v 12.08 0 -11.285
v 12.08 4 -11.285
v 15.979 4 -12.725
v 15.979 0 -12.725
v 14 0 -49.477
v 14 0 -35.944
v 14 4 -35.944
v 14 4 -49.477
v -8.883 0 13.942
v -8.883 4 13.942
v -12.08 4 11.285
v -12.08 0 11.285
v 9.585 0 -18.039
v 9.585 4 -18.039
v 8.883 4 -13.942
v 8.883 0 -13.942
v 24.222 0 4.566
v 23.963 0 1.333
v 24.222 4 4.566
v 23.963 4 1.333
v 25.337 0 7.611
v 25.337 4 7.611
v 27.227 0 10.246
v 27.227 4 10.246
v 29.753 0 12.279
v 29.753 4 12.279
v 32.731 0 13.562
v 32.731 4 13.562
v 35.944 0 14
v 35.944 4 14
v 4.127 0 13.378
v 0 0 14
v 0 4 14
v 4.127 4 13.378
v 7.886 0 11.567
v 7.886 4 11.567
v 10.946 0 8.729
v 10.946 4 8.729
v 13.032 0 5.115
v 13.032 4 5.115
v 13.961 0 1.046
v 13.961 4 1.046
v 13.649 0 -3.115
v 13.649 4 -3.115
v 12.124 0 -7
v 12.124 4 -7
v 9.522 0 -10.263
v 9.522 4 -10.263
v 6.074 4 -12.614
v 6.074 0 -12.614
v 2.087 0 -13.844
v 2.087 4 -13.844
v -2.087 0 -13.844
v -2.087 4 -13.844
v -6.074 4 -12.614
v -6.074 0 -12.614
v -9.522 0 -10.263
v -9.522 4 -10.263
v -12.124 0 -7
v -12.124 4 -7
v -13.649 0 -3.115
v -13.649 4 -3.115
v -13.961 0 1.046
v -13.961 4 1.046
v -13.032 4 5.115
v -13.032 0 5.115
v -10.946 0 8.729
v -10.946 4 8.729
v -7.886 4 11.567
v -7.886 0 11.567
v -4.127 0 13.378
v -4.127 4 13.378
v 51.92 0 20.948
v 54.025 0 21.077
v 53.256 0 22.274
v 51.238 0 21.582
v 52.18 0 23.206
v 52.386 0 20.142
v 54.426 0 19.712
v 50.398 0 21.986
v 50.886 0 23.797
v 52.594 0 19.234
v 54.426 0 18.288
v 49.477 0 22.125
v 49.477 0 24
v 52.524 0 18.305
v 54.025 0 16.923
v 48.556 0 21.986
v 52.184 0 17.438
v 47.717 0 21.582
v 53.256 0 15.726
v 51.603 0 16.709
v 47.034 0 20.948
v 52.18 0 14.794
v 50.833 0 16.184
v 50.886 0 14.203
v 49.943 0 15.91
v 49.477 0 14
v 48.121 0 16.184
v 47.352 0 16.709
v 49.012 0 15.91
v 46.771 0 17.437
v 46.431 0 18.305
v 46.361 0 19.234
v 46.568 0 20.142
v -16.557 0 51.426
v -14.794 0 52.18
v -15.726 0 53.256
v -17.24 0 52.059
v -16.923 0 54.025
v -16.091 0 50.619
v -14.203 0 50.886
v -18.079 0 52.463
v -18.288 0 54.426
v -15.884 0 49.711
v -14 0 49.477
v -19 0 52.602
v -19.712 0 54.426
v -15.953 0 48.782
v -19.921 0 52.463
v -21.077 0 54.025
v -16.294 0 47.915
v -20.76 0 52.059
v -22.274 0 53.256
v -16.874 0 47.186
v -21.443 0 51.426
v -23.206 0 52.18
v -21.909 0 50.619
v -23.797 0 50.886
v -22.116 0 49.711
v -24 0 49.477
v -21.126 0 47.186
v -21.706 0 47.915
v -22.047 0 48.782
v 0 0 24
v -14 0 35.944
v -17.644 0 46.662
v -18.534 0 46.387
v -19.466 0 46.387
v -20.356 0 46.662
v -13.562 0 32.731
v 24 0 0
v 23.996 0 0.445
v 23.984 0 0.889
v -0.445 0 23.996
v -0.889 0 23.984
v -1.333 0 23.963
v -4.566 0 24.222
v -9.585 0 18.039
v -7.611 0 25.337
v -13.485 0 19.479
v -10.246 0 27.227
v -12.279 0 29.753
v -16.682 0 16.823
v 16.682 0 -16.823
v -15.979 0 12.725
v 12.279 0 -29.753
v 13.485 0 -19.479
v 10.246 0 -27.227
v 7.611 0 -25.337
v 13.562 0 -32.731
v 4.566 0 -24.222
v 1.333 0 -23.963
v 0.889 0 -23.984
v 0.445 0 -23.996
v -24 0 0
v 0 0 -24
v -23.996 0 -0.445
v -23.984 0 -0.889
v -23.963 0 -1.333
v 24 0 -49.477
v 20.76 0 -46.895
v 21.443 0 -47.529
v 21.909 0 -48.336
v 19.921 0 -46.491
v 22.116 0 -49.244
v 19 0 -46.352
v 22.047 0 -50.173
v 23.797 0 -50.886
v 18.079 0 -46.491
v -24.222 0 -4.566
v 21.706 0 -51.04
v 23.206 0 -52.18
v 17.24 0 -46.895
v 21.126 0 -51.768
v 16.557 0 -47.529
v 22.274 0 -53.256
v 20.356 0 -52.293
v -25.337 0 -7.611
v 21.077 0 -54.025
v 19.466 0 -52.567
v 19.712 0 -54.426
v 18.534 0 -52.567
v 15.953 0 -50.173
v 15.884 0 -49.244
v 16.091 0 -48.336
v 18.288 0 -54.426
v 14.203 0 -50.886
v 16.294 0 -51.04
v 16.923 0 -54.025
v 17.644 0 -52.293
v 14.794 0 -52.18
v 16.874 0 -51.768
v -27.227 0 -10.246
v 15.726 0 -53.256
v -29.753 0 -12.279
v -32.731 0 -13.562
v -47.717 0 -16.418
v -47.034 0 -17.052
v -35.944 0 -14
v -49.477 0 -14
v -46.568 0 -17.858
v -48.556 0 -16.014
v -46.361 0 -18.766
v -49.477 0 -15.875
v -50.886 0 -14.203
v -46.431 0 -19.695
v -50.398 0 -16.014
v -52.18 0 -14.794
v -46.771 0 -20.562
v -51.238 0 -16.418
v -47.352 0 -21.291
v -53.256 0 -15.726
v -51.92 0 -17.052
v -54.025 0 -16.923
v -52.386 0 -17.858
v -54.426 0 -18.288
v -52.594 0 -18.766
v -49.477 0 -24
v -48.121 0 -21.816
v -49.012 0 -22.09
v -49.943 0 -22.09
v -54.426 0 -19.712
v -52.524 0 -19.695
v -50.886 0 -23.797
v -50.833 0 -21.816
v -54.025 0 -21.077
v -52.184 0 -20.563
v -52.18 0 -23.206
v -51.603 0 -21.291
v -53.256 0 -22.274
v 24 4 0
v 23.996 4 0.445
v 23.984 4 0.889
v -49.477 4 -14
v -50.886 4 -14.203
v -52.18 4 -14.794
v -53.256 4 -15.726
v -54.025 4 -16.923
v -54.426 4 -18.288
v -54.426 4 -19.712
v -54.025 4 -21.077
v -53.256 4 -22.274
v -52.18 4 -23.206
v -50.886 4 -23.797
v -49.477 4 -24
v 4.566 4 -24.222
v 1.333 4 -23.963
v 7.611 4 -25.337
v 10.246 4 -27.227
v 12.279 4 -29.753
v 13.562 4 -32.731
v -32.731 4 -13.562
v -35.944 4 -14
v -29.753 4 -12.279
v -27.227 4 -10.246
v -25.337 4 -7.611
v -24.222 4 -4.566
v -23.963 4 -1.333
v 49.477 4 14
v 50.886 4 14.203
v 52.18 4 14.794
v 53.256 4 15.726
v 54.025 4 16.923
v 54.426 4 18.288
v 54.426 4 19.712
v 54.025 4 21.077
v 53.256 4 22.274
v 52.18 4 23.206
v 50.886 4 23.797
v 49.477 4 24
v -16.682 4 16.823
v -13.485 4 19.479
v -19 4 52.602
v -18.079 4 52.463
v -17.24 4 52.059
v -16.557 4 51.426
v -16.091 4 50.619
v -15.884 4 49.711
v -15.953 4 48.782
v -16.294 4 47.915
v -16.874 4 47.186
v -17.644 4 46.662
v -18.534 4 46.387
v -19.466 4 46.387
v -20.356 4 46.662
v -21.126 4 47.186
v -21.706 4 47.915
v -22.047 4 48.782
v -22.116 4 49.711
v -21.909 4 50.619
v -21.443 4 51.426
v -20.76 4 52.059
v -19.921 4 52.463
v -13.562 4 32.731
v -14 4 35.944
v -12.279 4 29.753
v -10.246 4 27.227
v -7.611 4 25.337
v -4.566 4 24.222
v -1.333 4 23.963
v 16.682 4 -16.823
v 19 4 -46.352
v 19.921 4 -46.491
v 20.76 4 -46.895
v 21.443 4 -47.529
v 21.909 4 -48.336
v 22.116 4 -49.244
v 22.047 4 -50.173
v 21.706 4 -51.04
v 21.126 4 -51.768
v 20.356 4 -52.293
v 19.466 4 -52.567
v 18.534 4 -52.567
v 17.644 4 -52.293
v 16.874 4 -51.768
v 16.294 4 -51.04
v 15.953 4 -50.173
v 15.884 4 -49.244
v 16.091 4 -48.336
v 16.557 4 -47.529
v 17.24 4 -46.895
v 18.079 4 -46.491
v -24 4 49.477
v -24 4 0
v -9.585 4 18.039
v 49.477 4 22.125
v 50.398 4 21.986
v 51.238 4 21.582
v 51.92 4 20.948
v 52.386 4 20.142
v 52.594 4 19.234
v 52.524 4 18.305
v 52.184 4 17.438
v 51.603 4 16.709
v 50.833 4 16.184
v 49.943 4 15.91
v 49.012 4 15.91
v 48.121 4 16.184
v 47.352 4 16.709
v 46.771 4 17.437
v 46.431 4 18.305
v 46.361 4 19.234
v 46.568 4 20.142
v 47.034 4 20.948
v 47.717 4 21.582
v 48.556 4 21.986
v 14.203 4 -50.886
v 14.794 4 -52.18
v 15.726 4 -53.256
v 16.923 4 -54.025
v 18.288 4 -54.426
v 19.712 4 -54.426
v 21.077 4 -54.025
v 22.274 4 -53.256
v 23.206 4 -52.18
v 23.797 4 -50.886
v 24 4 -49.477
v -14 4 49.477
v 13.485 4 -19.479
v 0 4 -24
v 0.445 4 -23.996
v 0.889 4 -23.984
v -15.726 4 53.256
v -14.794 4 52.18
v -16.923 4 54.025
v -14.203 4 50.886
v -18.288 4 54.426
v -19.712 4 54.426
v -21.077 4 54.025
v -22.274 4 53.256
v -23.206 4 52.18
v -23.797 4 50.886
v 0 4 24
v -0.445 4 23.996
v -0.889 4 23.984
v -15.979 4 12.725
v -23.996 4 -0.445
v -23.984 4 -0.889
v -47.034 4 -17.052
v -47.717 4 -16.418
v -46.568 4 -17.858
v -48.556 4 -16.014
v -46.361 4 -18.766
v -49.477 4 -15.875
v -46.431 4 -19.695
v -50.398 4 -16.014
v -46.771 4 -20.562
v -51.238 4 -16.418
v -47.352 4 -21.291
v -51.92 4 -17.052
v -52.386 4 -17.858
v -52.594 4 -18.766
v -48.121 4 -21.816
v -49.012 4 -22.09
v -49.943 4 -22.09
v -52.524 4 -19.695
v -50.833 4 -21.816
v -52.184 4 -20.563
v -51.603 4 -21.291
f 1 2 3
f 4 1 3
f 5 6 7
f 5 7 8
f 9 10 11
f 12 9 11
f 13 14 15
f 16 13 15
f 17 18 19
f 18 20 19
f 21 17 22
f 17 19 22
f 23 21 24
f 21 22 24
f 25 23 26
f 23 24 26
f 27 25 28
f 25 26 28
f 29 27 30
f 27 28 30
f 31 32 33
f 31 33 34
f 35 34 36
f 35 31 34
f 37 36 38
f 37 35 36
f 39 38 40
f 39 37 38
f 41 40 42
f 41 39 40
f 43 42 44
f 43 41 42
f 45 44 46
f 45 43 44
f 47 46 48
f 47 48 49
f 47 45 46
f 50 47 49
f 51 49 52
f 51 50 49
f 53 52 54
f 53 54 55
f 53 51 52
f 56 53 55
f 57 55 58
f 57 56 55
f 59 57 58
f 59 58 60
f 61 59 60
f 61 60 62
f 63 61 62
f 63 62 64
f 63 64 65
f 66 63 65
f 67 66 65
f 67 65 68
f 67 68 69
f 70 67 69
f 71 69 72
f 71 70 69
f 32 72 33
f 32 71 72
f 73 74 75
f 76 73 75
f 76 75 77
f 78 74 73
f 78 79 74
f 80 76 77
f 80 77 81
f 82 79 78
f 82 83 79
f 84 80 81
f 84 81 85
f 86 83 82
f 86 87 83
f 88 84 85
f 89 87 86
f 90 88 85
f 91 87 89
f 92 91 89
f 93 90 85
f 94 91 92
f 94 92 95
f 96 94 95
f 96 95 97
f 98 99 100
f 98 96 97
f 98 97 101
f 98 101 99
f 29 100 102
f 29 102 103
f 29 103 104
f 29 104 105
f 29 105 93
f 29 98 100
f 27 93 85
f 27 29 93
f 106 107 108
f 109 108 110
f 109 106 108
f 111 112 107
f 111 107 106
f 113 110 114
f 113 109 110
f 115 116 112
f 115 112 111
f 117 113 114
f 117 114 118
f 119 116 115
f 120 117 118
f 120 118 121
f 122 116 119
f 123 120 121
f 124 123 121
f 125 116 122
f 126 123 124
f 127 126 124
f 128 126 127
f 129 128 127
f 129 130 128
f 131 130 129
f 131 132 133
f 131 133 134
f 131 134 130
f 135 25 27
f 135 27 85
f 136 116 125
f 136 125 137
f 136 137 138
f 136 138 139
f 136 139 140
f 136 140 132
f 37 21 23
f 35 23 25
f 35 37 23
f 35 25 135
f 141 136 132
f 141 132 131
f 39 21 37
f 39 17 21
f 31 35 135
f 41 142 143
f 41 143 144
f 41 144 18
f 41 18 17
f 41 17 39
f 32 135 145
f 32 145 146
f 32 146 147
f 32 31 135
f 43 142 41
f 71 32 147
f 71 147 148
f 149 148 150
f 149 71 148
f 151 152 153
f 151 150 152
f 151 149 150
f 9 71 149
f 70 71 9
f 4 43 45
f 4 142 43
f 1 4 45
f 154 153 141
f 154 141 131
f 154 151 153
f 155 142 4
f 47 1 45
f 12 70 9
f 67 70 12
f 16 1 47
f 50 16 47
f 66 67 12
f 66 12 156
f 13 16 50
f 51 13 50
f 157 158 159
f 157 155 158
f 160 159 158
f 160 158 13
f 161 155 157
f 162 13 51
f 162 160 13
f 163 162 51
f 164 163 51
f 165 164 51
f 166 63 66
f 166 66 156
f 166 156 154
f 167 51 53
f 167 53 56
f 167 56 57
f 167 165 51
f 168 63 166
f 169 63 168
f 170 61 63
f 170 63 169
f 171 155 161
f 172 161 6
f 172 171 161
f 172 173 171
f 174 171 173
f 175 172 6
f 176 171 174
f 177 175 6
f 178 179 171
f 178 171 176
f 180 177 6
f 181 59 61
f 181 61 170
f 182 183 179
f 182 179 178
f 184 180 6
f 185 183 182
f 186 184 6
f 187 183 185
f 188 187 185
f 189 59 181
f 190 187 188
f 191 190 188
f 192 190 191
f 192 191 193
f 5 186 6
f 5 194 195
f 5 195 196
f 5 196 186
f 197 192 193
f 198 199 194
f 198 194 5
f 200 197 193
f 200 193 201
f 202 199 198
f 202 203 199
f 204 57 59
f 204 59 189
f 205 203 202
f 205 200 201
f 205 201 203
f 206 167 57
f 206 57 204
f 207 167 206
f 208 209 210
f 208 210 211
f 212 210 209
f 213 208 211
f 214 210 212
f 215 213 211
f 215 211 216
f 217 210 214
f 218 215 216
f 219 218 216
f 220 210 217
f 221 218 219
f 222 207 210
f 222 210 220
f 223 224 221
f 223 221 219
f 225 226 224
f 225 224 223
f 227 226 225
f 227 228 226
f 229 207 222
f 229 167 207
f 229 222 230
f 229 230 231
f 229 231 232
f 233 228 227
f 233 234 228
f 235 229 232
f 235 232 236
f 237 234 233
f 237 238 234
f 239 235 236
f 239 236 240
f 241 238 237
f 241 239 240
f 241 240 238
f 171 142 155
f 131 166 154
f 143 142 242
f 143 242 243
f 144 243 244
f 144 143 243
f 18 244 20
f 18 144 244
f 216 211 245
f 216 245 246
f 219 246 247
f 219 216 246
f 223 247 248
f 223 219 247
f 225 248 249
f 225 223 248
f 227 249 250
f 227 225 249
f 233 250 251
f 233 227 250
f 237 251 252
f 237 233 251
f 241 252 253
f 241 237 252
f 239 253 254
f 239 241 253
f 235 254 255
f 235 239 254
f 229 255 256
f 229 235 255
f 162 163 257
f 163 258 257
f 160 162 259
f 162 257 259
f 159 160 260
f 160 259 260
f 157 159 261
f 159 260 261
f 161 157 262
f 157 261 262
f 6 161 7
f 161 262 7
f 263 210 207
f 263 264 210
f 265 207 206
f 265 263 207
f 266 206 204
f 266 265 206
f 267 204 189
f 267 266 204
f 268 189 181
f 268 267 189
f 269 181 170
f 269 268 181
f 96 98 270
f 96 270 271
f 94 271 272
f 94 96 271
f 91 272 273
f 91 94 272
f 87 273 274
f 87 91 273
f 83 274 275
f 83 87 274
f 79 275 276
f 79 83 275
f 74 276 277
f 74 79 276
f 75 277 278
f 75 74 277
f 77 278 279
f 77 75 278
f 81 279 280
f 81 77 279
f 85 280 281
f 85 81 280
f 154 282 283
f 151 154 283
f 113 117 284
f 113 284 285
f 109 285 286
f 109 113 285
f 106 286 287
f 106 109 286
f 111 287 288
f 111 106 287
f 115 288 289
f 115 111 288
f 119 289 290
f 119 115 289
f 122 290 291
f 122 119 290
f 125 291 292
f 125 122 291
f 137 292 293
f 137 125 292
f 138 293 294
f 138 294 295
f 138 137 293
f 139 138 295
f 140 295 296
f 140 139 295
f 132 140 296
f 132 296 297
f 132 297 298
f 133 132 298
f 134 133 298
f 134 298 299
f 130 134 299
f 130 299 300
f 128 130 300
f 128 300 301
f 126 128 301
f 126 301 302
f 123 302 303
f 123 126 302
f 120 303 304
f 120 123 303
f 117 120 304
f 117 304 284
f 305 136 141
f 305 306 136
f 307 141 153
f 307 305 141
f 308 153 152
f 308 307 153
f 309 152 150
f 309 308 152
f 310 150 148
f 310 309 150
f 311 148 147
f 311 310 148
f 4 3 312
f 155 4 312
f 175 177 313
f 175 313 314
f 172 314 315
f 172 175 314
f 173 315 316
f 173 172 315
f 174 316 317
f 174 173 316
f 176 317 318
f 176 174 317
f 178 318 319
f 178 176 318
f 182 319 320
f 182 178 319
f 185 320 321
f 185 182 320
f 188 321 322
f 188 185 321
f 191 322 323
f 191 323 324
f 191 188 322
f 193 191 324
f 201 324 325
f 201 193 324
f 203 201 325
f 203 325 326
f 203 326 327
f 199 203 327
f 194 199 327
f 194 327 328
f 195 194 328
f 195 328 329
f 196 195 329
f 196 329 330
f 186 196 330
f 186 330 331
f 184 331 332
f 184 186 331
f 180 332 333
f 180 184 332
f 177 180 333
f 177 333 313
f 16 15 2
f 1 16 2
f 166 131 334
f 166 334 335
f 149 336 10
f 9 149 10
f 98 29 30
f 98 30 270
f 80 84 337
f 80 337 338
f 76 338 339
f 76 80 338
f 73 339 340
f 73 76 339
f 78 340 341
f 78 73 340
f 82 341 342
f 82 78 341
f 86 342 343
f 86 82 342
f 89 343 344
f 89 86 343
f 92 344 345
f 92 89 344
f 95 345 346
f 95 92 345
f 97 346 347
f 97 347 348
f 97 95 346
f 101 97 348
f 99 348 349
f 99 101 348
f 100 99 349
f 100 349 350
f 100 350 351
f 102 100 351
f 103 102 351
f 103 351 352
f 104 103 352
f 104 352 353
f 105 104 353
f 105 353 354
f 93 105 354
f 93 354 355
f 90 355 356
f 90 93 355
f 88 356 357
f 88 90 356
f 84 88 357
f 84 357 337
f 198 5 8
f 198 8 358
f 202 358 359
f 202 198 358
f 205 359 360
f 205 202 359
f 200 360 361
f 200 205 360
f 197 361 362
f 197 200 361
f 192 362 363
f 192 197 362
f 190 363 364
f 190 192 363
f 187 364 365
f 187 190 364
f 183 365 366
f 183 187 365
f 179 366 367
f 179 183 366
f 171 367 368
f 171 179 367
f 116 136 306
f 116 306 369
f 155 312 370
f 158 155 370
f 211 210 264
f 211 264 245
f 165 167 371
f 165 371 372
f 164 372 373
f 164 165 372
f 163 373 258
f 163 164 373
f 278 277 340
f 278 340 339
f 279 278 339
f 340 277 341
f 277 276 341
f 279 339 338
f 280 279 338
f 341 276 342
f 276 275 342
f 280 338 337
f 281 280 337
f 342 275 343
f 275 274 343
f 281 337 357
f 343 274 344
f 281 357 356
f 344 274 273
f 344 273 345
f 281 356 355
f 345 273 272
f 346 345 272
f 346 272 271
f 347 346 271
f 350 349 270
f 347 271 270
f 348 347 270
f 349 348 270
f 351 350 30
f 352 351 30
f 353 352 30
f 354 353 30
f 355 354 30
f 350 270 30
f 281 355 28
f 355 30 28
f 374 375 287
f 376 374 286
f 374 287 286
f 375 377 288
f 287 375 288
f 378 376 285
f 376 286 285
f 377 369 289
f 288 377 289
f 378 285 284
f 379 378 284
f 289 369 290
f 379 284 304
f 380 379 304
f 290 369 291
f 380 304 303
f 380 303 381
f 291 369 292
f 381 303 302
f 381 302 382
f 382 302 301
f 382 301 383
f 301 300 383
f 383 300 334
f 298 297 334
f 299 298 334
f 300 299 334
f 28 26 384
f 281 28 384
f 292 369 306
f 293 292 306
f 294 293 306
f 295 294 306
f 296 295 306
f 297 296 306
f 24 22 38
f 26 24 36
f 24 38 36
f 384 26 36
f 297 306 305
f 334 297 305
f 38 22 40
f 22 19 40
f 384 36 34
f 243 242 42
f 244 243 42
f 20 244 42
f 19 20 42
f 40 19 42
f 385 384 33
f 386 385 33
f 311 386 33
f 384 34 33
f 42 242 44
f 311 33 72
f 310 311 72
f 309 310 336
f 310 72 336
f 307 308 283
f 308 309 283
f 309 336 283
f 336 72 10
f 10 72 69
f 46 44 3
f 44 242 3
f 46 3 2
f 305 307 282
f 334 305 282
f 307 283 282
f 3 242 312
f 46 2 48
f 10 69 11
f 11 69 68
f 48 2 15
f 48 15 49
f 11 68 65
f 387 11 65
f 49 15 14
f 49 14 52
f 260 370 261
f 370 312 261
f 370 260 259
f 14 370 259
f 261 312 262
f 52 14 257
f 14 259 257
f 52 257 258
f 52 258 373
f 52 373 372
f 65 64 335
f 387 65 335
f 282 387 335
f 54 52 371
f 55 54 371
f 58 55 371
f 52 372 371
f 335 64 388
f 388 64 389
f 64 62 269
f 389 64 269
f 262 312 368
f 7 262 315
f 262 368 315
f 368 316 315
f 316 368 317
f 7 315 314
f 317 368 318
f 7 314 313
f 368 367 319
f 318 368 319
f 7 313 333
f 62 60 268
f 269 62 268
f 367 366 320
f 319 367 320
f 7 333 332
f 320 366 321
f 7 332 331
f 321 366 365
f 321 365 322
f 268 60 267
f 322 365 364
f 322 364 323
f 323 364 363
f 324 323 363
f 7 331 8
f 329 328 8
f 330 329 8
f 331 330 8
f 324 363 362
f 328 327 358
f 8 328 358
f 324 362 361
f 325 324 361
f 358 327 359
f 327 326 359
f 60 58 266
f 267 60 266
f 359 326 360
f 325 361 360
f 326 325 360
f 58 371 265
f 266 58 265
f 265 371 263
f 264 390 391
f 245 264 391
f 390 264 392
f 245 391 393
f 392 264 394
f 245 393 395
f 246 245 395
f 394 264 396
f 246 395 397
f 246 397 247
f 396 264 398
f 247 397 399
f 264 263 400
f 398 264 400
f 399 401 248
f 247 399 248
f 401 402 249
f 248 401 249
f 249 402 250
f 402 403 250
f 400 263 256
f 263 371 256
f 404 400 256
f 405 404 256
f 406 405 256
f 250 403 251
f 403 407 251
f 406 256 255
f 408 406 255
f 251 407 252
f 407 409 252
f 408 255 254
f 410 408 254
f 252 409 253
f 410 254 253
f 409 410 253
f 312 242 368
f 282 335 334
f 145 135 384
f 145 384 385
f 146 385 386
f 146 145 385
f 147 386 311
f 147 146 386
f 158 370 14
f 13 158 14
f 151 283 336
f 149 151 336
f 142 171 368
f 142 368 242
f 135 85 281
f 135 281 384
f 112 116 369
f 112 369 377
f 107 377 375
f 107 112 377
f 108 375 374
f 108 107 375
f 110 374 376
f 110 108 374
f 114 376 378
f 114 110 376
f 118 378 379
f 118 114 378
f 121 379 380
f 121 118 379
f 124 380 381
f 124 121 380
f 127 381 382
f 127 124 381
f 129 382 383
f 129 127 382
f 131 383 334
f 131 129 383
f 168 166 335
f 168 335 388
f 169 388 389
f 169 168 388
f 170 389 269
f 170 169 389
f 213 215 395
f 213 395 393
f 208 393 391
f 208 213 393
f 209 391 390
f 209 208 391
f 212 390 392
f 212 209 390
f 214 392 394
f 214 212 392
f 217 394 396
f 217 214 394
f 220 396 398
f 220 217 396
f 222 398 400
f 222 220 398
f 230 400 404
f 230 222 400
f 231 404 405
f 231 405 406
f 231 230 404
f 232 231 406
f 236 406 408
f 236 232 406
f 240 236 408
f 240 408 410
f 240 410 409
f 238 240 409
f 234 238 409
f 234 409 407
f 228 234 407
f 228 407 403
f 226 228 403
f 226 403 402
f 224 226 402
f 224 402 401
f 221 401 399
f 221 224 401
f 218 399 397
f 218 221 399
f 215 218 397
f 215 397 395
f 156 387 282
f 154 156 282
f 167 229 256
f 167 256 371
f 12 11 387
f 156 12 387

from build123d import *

# Parameters (mm, degrees)
SKETCH1_R           = 14
SKETCH1_R_2         = 3.125
BOSS_EXTRUDE1_DEPTH = 4
FILLET1_R           = 12
CUT_EXTRUDE2_DEPTH  = 10


with BuildPart() as part:
    # Sketch1 → Boss-Extrude1 (new body)
    with BuildSketch(Plane(origin=(0, 0, 0), x_dir=(1, 0, 0), z_dir=(0, 1, 0))):
        with BuildLine():
            Line((-49.477267507, 24), (0, 24))
            ThreePointArc((0, 24), (7.353702178, 22.845635563), (14, 19.49358869))
            Line((14, 19.49358869), (14, 49.477267507))
            ThreePointArc((14, 49.477267507), (19, 54.477267507), (24, 49.477267507))
            Line((24, 49.477267507), (24, 0))
            ThreePointArc((24, 0), (22.845635563, -7.353702178), (19.49358869, -14))
            Line((19.49358869, -14), (49.477267507, -14))
            ThreePointArc((49.477267507, -14), (54.477267507, -19), (49.477267507, -24))
            Line((49.477267507, -24), (0, -24))
            ThreePointArc((0, -24), (-7.353702178, -22.845635563), (-14, -19.49358869))
            Line((-14, -19.49358869), (-14, -49.477267507))
            ThreePointArc((-14, -49.477267507), (-19, -54.477267507), (-24, -49.477267507))
            Line((-24, -49.477267507), (-24, 0))
            ThreePointArc((-24, 0), (-22.845635563, 7.353702178), (-19.49358869, 14))
            Line((-19.49358869, 14), (-49.477267507, 14))
            ThreePointArc((-49.477267507, 14), (-54.477267507, 19), (-49.477267507, 24))
        make_face()
        with Locations(Location((0, 0, 0), (0, 0, 270))):
            Circle(SKETCH1_R, mode=Mode.SUBTRACT)
        with Locations(Location((-19, -49.477267507, 0), (0, 0, 270))):
            Circle(SKETCH1_R_2, mode=Mode.SUBTRACT)
        with Locations(Location((-49.477267507, 19, 0), (0, 0, 270))):
            Circle(SKETCH1_R_2, mode=Mode.SUBTRACT)
        with Locations(Location((19, 49.477267507, 0), (0, 0, 270))):
            Circle(SKETCH1_R_2, mode=Mode.SUBTRACT)
        with Locations(Location((49.477267507, -19, 0), (0, 0, 270))):
            Circle(SKETCH1_R_2, mode=Mode.SUBTRACT)
    extrude(amount=BOSS_EXTRUDE1_DEPTH)

    # Fillet1
    fillet1_edges = [part.edges().sort_by_distance(p)[0] for p in [
        (-19.49358869, 2, -14),
        (14, 2, -19.49358869),
        (19.49358869, 2, 14),
        (-14, 2, 19.49358869),
    ]]
    fillet(fillet1_edges, radius=FILLET1_R)

    # Sketch3 → Cut-Extrude2 (cut)
    with BuildSketch(Plane(origin=(0, 4, 0), x_dir=(1, 0, 0), z_dir=(0, 1, 0))):
        Polygon((9.585169941, 18.038972177), (8.882922363, 13.941796523), (12.080056774, 11.285044454), (15.979438763, 12.725468039), (16.681686341, 16.822643693), (13.48455193, 19.479395762), align=None)
        Polygon((-15.979438763, -12.725468039), (-16.681686341, -16.822643693), (-13.48455193, -19.479395762), (-9.585169941, -18.038972177), (-8.882922363, -13.941796523), (-12.080056774, -11.285044454), align=None)
    extrude(amount=-CUT_EXTRUDE2_DEPTH, mode=Mode.SUBTRACT)


solid = part.part
